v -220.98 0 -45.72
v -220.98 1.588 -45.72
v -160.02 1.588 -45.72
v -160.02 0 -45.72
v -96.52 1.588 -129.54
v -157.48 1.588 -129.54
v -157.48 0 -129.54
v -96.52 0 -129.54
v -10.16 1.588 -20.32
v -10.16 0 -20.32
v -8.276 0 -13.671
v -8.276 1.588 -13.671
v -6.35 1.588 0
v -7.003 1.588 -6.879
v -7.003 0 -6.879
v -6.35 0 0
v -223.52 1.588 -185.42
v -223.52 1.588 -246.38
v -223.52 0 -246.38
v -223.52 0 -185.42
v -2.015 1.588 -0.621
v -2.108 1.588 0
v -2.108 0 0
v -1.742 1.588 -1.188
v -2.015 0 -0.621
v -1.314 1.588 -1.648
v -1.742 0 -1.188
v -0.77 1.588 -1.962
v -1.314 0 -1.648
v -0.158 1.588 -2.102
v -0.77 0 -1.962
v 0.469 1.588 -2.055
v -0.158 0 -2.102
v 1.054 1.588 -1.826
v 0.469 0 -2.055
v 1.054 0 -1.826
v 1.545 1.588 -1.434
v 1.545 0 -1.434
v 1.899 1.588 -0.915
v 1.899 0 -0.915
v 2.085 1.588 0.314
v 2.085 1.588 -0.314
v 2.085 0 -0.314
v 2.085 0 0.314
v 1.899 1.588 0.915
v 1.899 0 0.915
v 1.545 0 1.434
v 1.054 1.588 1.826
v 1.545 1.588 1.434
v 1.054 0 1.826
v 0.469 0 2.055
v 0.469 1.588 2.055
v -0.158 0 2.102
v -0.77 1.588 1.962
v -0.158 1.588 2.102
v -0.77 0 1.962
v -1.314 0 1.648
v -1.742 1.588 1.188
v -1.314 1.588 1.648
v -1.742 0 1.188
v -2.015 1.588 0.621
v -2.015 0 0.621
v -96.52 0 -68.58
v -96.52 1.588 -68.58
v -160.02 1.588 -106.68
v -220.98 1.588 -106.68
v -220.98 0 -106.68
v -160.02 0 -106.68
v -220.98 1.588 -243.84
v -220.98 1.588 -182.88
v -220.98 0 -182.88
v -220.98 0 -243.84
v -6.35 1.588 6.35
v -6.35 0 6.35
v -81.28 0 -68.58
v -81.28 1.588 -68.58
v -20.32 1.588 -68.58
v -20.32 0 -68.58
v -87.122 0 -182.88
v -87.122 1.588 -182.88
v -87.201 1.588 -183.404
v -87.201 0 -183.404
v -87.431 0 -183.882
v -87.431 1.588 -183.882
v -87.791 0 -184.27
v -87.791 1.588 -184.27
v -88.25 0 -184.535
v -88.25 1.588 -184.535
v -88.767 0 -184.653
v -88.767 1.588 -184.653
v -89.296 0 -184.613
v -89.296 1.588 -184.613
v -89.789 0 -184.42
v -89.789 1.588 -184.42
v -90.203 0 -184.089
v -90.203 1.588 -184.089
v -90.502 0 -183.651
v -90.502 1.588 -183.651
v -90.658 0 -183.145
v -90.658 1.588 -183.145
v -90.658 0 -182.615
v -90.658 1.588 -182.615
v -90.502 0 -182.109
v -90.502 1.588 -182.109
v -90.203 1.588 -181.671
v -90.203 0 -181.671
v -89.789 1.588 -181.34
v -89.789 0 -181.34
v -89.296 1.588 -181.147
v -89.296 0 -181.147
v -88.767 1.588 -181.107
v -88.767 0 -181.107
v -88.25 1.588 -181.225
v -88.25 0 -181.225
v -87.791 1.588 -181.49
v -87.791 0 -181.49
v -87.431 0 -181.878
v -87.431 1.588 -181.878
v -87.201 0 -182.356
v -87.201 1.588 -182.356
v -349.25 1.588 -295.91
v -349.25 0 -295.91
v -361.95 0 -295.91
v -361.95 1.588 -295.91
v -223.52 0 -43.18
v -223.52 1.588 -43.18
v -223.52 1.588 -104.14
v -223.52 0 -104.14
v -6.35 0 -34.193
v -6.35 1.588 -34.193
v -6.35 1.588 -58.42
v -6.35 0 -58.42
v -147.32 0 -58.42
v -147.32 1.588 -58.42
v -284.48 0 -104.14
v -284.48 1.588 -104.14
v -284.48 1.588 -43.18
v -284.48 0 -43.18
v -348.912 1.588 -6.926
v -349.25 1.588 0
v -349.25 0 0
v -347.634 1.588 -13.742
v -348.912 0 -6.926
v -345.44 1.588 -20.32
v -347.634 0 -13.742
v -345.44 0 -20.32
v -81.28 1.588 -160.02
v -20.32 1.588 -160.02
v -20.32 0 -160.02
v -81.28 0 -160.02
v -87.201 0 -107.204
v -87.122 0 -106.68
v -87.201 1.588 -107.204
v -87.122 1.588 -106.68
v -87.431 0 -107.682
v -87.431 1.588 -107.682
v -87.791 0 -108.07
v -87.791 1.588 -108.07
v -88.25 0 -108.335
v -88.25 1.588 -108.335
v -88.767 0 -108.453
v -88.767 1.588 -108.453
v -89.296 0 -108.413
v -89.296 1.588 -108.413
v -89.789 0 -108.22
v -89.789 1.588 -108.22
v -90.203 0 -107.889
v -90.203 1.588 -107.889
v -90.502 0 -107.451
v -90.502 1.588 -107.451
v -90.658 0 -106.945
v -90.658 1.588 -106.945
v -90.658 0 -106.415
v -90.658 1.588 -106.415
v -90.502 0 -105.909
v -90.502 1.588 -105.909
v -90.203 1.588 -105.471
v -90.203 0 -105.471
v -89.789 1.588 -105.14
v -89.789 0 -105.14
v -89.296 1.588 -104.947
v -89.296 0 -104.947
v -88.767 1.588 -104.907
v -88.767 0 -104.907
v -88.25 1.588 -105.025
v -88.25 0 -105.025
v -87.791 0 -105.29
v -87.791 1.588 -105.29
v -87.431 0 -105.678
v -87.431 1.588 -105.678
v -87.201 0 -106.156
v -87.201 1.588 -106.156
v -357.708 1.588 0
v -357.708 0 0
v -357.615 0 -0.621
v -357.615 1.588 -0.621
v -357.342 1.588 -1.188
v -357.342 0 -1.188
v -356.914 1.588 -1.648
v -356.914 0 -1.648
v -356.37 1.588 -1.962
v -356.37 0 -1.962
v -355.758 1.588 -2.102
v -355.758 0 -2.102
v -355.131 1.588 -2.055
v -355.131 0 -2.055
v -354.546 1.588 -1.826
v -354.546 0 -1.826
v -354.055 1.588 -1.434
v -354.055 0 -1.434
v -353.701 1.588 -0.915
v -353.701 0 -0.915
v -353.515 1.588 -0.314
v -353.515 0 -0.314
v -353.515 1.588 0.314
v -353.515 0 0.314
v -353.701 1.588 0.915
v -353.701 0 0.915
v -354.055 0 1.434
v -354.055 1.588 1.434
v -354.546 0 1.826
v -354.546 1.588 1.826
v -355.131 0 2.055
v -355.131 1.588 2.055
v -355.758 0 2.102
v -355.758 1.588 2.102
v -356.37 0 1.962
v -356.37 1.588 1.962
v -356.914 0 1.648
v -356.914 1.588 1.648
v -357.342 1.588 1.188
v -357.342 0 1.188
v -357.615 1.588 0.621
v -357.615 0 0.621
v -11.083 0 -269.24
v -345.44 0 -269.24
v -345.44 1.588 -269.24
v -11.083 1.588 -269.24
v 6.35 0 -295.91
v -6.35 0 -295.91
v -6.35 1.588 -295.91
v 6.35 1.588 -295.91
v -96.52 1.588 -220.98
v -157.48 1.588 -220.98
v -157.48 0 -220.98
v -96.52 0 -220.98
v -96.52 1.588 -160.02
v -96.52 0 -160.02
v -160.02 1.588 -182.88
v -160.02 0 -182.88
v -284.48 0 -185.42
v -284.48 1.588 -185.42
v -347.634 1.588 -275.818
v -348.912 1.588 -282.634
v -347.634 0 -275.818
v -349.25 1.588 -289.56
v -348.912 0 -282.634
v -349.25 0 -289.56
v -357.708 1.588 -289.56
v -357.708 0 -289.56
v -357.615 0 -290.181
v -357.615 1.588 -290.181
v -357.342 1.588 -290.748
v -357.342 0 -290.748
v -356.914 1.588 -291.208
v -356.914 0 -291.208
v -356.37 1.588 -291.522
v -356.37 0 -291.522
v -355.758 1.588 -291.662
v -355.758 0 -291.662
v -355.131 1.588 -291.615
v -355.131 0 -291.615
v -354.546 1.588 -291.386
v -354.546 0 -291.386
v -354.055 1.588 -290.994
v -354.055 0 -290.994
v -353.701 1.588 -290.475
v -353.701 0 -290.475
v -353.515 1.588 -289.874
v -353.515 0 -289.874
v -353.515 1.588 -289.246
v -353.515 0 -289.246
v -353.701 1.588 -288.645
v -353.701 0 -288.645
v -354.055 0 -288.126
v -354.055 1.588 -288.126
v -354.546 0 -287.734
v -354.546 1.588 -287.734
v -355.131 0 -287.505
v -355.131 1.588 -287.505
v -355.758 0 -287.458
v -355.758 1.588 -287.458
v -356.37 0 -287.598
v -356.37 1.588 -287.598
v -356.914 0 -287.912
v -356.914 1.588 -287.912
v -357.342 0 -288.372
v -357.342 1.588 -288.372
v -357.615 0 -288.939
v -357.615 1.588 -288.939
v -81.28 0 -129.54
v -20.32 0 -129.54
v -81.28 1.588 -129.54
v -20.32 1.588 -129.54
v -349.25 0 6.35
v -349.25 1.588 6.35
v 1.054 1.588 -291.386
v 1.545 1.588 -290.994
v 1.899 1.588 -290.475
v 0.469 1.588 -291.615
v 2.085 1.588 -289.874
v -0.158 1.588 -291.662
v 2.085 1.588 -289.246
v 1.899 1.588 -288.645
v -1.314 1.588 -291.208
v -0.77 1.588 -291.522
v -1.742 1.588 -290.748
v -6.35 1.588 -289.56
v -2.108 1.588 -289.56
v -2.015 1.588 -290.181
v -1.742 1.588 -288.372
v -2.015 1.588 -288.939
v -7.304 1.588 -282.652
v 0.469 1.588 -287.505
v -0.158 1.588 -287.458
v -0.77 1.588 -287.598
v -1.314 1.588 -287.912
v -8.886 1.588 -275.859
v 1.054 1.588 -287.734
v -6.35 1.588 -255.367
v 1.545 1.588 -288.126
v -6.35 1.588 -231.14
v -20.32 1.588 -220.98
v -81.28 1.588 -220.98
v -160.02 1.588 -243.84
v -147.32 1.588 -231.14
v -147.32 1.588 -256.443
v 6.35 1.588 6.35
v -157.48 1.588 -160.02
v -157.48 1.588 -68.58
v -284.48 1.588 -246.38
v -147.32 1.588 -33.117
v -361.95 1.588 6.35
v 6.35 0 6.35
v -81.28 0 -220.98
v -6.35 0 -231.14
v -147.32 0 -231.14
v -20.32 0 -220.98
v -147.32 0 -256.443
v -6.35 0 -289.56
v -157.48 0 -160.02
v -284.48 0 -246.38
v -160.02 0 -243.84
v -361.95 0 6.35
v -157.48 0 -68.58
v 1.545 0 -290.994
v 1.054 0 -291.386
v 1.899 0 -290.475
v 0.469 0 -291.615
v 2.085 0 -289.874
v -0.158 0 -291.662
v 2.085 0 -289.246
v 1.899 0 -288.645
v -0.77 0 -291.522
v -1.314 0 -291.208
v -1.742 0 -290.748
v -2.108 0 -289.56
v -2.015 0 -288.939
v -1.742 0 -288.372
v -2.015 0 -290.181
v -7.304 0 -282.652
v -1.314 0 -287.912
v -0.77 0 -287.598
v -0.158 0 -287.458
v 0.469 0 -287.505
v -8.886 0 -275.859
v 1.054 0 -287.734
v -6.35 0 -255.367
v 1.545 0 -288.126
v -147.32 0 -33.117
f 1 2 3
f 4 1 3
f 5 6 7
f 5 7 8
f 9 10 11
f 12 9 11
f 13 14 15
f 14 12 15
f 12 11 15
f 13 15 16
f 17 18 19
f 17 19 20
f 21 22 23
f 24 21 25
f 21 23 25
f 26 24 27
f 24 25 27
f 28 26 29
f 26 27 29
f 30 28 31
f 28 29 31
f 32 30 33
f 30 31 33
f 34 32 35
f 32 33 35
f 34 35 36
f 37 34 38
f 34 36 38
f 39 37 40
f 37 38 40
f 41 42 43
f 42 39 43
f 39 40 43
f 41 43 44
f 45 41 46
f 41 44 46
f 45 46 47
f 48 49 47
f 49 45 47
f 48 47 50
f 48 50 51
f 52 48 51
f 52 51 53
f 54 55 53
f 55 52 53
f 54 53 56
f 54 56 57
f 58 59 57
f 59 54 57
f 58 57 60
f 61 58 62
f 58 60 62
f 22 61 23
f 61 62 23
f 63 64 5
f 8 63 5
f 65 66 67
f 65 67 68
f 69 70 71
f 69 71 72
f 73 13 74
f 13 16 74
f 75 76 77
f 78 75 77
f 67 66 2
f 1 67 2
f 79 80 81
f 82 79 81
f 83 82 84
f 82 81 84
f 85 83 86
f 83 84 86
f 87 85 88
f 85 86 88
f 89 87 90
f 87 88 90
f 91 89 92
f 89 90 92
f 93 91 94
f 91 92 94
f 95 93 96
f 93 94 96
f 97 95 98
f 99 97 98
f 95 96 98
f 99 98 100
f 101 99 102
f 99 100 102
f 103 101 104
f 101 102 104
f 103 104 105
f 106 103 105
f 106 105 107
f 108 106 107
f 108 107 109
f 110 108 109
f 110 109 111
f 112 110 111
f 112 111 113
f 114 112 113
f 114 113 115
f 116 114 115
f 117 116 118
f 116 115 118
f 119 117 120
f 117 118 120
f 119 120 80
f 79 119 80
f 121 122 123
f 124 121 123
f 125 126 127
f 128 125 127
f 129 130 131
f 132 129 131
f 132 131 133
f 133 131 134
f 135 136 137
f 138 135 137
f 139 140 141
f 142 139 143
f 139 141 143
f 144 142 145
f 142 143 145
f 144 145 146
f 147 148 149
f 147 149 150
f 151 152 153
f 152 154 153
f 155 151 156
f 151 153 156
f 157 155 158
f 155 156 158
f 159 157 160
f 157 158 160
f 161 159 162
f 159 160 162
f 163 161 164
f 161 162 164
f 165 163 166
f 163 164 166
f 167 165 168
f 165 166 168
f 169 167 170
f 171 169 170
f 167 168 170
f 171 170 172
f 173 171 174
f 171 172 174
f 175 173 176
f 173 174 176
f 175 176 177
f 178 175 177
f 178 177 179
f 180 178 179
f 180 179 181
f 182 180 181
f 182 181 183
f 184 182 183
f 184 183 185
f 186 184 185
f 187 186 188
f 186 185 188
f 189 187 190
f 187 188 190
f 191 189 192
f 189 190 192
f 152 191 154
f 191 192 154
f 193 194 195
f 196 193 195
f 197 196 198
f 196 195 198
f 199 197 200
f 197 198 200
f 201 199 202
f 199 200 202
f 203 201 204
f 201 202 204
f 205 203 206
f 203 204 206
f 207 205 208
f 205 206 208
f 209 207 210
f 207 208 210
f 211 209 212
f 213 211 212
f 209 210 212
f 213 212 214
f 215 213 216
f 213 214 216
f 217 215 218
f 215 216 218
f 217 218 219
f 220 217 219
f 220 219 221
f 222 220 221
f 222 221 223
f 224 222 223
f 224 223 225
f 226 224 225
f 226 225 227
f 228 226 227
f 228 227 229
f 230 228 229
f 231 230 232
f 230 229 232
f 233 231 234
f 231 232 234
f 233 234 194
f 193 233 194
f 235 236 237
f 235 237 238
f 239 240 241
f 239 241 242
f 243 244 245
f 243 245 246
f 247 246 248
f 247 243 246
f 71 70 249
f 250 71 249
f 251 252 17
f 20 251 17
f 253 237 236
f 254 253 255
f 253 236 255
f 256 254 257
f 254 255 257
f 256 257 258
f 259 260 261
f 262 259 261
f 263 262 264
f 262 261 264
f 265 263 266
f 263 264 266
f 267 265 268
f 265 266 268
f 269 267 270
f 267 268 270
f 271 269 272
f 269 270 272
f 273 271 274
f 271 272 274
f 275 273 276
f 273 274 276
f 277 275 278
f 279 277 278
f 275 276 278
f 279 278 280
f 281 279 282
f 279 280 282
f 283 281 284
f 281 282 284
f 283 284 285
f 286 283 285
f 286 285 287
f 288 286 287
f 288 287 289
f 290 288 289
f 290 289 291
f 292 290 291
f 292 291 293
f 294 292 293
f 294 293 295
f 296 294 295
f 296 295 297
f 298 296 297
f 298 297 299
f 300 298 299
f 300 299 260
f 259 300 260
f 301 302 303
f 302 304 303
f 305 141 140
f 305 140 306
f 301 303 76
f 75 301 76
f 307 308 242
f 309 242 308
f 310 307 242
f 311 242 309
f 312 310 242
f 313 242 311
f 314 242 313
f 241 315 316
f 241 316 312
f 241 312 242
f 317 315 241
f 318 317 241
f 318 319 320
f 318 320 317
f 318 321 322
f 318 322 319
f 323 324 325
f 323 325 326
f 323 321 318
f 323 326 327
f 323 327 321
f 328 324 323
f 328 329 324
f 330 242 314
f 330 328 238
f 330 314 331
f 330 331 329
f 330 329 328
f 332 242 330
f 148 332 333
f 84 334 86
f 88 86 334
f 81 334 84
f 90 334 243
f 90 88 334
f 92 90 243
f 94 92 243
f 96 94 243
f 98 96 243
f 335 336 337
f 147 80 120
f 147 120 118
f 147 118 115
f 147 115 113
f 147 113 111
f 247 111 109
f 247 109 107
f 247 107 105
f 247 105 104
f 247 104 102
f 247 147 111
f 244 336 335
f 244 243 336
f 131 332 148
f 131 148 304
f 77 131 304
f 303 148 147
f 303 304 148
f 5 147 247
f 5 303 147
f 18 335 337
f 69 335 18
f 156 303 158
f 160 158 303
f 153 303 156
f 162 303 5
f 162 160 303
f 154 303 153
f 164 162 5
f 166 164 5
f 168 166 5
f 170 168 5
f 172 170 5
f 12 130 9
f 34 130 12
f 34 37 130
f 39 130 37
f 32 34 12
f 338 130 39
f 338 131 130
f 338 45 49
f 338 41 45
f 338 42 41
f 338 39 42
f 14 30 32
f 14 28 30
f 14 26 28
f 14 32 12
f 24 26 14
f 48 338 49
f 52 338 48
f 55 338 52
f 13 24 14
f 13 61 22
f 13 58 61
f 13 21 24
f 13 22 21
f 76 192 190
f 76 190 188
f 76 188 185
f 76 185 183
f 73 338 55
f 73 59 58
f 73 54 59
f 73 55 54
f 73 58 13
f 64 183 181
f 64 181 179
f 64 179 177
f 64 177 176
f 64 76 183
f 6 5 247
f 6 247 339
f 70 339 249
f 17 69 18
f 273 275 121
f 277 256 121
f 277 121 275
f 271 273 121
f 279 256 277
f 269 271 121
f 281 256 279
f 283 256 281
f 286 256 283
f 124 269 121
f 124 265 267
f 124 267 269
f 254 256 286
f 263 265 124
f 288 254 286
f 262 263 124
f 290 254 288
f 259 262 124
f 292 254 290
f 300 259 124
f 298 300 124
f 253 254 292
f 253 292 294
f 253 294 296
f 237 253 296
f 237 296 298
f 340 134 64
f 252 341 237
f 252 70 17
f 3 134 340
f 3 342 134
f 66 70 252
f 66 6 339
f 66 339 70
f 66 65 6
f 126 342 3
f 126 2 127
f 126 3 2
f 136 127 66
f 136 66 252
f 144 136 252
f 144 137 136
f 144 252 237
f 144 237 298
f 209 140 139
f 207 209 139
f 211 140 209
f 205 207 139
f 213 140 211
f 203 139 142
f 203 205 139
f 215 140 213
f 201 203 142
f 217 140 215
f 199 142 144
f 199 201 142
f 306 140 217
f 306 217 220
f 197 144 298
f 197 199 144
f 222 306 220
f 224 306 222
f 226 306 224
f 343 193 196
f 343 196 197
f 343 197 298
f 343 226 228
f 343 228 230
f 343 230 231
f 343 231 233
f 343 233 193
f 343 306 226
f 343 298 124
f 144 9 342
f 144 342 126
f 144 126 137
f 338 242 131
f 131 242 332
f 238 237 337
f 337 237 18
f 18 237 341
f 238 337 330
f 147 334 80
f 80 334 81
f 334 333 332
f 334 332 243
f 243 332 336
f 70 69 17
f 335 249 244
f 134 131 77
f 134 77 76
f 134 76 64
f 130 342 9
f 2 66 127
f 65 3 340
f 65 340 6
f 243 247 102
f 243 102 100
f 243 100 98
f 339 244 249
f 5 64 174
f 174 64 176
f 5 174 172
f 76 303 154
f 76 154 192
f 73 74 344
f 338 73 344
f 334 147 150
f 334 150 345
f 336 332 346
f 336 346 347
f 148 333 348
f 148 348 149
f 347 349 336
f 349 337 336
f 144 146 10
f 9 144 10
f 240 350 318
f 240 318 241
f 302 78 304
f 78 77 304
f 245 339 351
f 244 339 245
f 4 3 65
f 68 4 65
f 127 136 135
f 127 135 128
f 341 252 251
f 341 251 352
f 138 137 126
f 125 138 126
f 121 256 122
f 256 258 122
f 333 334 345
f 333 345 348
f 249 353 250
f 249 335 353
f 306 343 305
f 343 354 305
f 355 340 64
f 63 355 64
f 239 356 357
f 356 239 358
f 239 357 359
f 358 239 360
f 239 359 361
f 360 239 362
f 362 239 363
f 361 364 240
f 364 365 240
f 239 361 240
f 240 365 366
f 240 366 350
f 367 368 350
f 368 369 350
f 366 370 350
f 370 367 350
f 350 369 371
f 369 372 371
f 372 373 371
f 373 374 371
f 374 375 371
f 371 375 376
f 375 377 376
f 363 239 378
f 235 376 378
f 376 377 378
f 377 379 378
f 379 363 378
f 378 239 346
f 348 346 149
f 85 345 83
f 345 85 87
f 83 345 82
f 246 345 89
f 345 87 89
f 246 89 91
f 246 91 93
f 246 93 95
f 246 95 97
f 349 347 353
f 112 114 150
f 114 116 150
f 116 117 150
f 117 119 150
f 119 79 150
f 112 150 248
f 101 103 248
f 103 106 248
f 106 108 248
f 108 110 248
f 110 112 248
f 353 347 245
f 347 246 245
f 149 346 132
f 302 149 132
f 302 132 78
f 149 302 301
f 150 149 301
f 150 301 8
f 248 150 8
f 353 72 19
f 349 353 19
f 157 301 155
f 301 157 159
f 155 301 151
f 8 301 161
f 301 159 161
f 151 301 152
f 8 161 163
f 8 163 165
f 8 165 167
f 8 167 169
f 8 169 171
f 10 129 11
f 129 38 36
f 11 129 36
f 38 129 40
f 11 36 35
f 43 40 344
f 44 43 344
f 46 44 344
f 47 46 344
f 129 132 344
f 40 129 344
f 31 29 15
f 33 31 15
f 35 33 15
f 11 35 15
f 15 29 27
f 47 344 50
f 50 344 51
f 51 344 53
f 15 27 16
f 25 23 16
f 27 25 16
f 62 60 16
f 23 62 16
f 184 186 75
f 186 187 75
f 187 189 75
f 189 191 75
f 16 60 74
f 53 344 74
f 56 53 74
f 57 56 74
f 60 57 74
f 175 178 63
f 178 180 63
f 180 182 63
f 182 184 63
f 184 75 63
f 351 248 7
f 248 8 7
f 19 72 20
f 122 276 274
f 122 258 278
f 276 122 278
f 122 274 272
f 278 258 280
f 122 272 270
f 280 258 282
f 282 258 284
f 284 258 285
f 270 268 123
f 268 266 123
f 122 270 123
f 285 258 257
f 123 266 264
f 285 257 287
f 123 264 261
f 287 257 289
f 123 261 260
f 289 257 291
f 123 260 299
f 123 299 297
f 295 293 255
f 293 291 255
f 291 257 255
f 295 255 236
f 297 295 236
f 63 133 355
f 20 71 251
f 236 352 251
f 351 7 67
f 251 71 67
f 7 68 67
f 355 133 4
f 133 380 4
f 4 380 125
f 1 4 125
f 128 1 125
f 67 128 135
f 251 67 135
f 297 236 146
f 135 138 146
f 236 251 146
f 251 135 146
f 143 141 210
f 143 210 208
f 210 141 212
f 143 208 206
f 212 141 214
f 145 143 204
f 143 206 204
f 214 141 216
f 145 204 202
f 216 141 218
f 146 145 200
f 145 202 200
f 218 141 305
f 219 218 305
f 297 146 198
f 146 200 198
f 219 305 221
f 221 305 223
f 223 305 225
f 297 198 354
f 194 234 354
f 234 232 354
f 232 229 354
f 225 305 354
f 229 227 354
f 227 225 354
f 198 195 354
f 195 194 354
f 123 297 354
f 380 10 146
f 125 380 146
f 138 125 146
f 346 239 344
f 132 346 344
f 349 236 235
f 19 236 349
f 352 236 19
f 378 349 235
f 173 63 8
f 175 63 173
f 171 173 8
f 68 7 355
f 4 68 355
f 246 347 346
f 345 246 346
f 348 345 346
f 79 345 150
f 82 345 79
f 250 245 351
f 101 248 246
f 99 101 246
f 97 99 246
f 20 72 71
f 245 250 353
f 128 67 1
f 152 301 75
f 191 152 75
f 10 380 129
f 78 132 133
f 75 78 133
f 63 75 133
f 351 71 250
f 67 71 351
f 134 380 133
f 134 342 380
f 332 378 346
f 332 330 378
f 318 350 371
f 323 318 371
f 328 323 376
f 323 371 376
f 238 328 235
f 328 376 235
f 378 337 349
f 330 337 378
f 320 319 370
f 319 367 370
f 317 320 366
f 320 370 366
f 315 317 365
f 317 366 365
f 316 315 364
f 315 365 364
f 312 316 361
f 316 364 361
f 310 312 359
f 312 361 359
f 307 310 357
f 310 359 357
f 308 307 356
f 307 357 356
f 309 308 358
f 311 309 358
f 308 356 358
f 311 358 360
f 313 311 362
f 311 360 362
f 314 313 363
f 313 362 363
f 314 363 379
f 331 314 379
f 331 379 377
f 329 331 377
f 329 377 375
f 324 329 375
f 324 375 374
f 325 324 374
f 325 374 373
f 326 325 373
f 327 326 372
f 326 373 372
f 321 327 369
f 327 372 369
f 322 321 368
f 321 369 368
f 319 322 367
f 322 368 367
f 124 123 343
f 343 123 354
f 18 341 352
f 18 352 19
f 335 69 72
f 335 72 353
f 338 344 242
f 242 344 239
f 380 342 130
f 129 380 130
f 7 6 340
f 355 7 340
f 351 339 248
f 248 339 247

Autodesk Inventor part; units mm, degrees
ref_plane "YZ Plane" through (0, 0, 0) normal (1, 0, 0) x (0, 1, 0)
ref_plane "XZ Plane" through (0, 0, 0) normal (0, 1, 0) x (-1, 0, 0)
ref_plane "XY Plane" through (0, 0, 0) normal (0, 0, 1) x (1, 0, 0)
sketch "Sketch1" plane through (0, 0, 0) normal (0, 1, 0) x (-1, 0, 0)
  line L0 (0, 0) -> (355.6, 0)
  line L1 (355.6, 0) -> (355.6, -289.56)
  line L2 (355.6, -289.56) -> (0, -289.56)
  line L3 (0, -289.56) -> (0, 0)
  circle A0 centre (355.6, 0) radius 2.1082
  line L4 (355.6, 0) -> (361.95, 0)
  line L5 (355.6, 0) -> (355.6, 6.35)
  line L6 (355.6, 6.35) -> (361.95, 6.35)
  line L7 (0, -289.56) -> (0, -295.91)
  line L8 (0, -295.91) -> (-6.35, -295.91)
  line L9 (-6.35, -295.91) -> (361.95, -295.91)
  line L10 (361.95, -295.91) -> (361.95, 6.35)
  line L11 (361.95, 6.35) -> (-6.35, 6.35)
  line L12 (-6.35, 6.35) -> (-6.35, -295.91)
  circle A1 centre (355.6, -289.56) radius 2.1082
  circle A2 centre (0, -289.56) radius 2.1082
  circle A3 centre (0, 0) radius 2.1082
  line L13 (0, 0) -> (0, -20.32)
  line L14 (0, -20.32) -> (10.16, -20.32)
  line L15 (0, 0) -> (5.08, 0)
  line L16 (0, -289.56) -> (5.08, -289.56)
  line L17 (0, -289.56) -> (0, -269.24)
  line L18 (0, -269.24) -> (11.0826, -269.24)
  line L19 (355.6, 0) -> (355.6, -20.32)
  line L20 (355.6, -20.32) -> (345.44, -20.32)
  line L21 (355.6, 0) -> (350.52, 0)
  line L22 (355.6, -289.56) -> (350.52, -289.56)
  line L23 (355.6, -289.56) -> (355.6, -269.24)
  line L24 (355.6, -269.24) -> (345.44, -269.24)
  line L25 (345.44, -20.32) -> (10.16, -20.32)
  line L26 (355.6, -20.32) -> (355.6, -33.02)
  line L27 (355.6, -33.02) -> (0, -33.02)
  line L28 (355.6, -269.24) -> (355.6, -256.54)
  line L29 (355.6, -256.54) -> (0, -256.54)
  line L30 (345.44, -269.24) -> (11.0826, -269.24)
  line L31 (0, 0) -> (6.35, 0)
  arc A4 (6.35, 0) -> (10.16, -20.32) centre (82.4575, 3.753) ccw
  line L32 (6.35, 0) -> (-6.35, 0)
  line L33 (-6.35, 0) -> (-6.35, -289.56)
  line L34 (-6.35, -289.56) -> (6.35, -289.56)
  line L35 (6.35, -289.56) -> (6.35, 0)
  arc A5 (11.0826, -269.24) -> (6.35, -289.56) centre (82.2313, -296.5221) ccw
  line L36 (355.6, 0) -> (349.25, 0)
  line L37 (349.25, 0) -> (349.25, -289.56)
  arc A6 (349.25, -289.56) -> (345.44, -269.24) centre (298.4597, -288.566) ccw
  arc A7 (345.44, -20.32) -> (349.25, 0) centre (298.4597, -0.994) ccw
  line L38 (349.25, 0) -> (349.25, 6.35)
  line L39 (349.25, -289.56) -> (349.25, -295.91)
  line L40 (6.35, -289.56) -> (6.35, -295.91)
  line L41 (6.35, 0) -> (6.35, 6.35)
  dimension "d0" = 355.6
  dimension "d1" = 289.56
  dimension "d2" = 4.2164
  dimension "d3" = 6.35
  dimension "d4" = 6.35
  dimension "d5" = 6.35
  dimension "d6" = 6.35
  dimension "d7" = 20.32
  dimension "d8" = 10.16
  dimension "d10" = 20.32
  dimension "d12" = 20.32
  dimension "d13" = 10.16
  dimension "d16" = 5.08
  dimension "d17" = 20.32
  dimension "d18" = 10.16
  dimension "d20" = 12.7
  dimension "d21" = 12.7
  dimension "d23" = 6.35
  dimension "d24" = 76.2
  dimension "d25" = 76.2
  dimension "d26" = 6.35
  dimension "d27" = 50.8
  dimension "d28" = 50.8
extrude "Extrusion1" add sketch "Sketch1" along normal blind 1.5875 contours A3 L32 L12 L11 L41 L0 | L0 L35 L14 L3 A3 | L3 A2 L34 L12 L32 A3 | L14 L35 L27 L3 | A4 L14 L35 | L27 L35 L29 L3 | L14 L25 L20 L37 L27 L35 | L34 A2 L7 L8 L12 | L38 L11 L5 A0 L0 | L0 A0 L1 L20 L37 A7 | L29 L35 L18 L3 | L27 L37 L29 L35 | L37 L20 A7 | L18 L35 L2 A2 L3 | L29 L37 L24 L30 L18 L35 | L37 L20 L1 L27 | L27 L1 L29 L37 | L7 A2 L2 L40 L9 | L6 L10 L4 A0 L5 | L18 A5 L35 | L29 L1 L24 L37 | L1 A0 L4 L10 L9 L39 L2 A1 | L37 A6 L24 | L24 L1 A1 L2 A6 L37
sketch "Sketch2" plane through (0, 1.5875, 0) normal (0, 1, 0) x (1, 0, 0)
  circle A0 centre (-355.6, 289.56) radius 2.1082 projected
  line L0 (-355.6, 289.56) -> (-355.6, 246.38)
  line L1 (-355.6, 246.38) -> (-284.48, 246.38)
  line L2 (-355.6, 289.56) -> (-355.6, 185.42)
  line L3 (-355.6, 185.42) -> (-223.52, 185.42)
  line L4 (-284.48, 246.38) -> (-223.52, 246.38)
  line L5 (-223.52, 246.38) -> (-223.52, 185.42)
  line L6 (-223.52, 185.42) -> (-284.48, 185.42)
  line L7 (-284.48, 185.42) -> (-284.48, 246.38)
  line L8 (-355.6, 289.56) -> (-355.6, 243.84)
  line L9 (-355.6, 243.84) -> (-220.98, 243.84)
  line L10 (-355.6, 289.56) -> (-355.6, 184.15)
  line L11 (-355.6, 289.56) -> (-355.6, 182.88)
  line L12 (-355.6, 182.88) -> (-160.02, 182.88)
  line L13 (-220.98, 243.84) -> (-160.02, 243.84)
  line L14 (-160.02, 243.84) -> (-160.02, 182.88)
  line L15 (-160.02, 182.88) -> (-220.98, 182.88)
  line L16 (-220.98, 182.88) -> (-220.98, 243.84)
  line L17 (-355.6, 289.56) -> (-355.6, 220.98)
  line L18 (-355.6, 220.98) -> (-157.48, 220.98)
  line L19 (-355.6, 289.56) -> (-355.6, 160.02)
  line L20 (-355.6, 160.02) -> (-96.52, 160.02)
  line L21 (-157.48, 220.98) -> (-96.52, 220.98)
  line L22 (-96.52, 220.98) -> (-96.52, 160.02)
  line L23 (-96.52, 160.02) -> (-157.48, 160.02)
  line L24 (-157.48, 160.02) -> (-157.48, 220.98)
  line L25 (-355.6, 289.56) -> (-81.28, 289.56)
  line L26 (-81.28, 289.56) -> (-81.28, 220.98)
  line L27 (-355.6, 289.56) -> (-20.32, 289.56)
  line L28 (-20.32, 289.56) -> (-20.32, 160.02)
  line L29 (-81.28, 220.98) -> (-20.32, 220.98)
  line L30 (-20.32, 220.98) -> (-20.32, 160.02)
  line L31 (-20.32, 160.02) -> (-81.28, 160.02)
  line L32 (-81.28, 160.02) -> (-81.28, 220.98)
  line L33 (-355.6, 289.56) -> (-160.02, 289.56)
  line L34 (-160.02, 289.56) -> (-160.02, 269.24)
  line L35 (-11.0826, 269.24) -> (-345.44, 269.24) projected
  line L36 (-160.02, 269.24) -> (-160.02, 256.54)
  line L37 (-160.02, 256.54) -> (6.35, 255.27)
  line L38 (6.35, -6.35) -> (6.35, 295.91) projected
  line L39 (6.35, 255.27) -> (-6.3496, 255.3669)
  line L40 (-160.02, 289.56) -> (-160.02, 231.14)
  line L41 (-6.3496, 255.3669) -> (-6.3496, 231.14)
  line L42 (-6.3496, 231.14) -> (-160.02, 231.14)
  line L43 (-160.02, 256.54) -> (-147.32, 256.54)
  line L44 (-147.32, 256.54) -> (-147.32, 231.14)
  line L45 (-147.32, 231.14) -> (-160.02, 231.14)
  line L46 (-160.02, 231.14) -> (-160.02, 256.54)
  line L47 (6.35, 295.91) -> (6.35, -6.35)
  line L48 (-361.95, 295.91) -> (-361.95, -6.35) projected
  line L49 (6.35, 144.78) -> (-361.95, 144.78)
  circle A1 centre (-355.6, 0) radius 2.1082
  line L50 (-355.6, 0) -> (-355.6, 43.18)
  line L51 (-355.6, 43.18) -> (-284.48, 43.18)
  line L52 (-355.6, 0) -> (-355.6, 104.14)
  line L53 (-355.6, 104.14) -> (-223.52, 104.14)
  line L54 (-284.48, 43.18) -> (-223.52, 43.18)
  line L55 (-223.52, 43.18) -> (-223.52, 104.14)
  line L56 (-223.52, 104.14) -> (-284.48, 104.14)
  line L57 (-284.48, 104.14) -> (-284.48, 43.18)
  line L58 (-355.6, 0) -> (-355.6, 45.72)
  line L59 (-355.6, 45.72) -> (-220.98, 45.72)
  line L60 (-355.6, 0) -> (-355.6, 105.41)
  line L61 (-355.6, 0) -> (-355.6, 106.68)
  line L62 (-355.6, 106.68) -> (-160.02, 106.68)
  line L63 (-220.98, 45.72) -> (-160.02, 45.72)
  line L64 (-160.02, 45.72) -> (-160.02, 106.68)
  line L65 (-160.02, 106.68) -> (-220.98, 106.68)
  line L66 (-220.98, 106.68) -> (-220.98, 45.72)
  line L67 (-355.6, 0) -> (-355.6, 68.58)
  line L68 (-355.6, 68.58) -> (-157.48, 68.58)
  line L69 (-355.6, 0) -> (-355.6, 129.54)
  line L70 (-355.6, 129.54) -> (-96.52, 129.54)
  line L71 (-157.48, 68.58) -> (-96.52, 68.58)
  line L72 (-96.52, 68.58) -> (-96.52, 129.54)
  line L73 (-96.52, 129.54) -> (-157.48, 129.54)
  line L74 (-157.48, 129.54) -> (-157.48, 68.58)
  line L75 (-355.6, 0) -> (-81.28, 0)
  line L76 (-81.28, 0) -> (-81.28, 68.58)
  line L77 (-355.6, 0) -> (-20.32, 0)
  line L78 (-20.32, 0) -> (-20.32, 129.54)
  line L79 (-81.28, 68.58) -> (-20.32, 68.58)
  line L80 (-20.32, 68.58) -> (-20.32, 129.54)
  line L81 (-20.32, 129.54) -> (-81.28, 129.54)
  line L82 (-81.28, 129.54) -> (-81.28, 68.58)
  line L83 (-355.6, 0) -> (-160.02, 0)
  line L84 (-160.02, 0) -> (-160.02, 20.32)
  line L85 (-11.0826, 20.32) -> (-345.44, 20.32)
  line L86 (-160.02, 20.32) -> (-160.02, 33.02)
  line L87 (-160.02, 33.02) -> (6.35, 34.29)
  line L88 (6.35, 34.29) -> (-6.3496, 34.1931)
  line L89 (-160.02, 0) -> (-160.02, 58.42)
  line L90 (-6.3496, 34.1931) -> (-6.3496, 58.42)
  line L91 (-6.3496, 58.42) -> (-160.02, 58.42)
  line L92 (-160.02, 33.02) -> (-147.32, 33.02)
  line L93 (-147.32, 33.02) -> (-147.32, 58.42)
  line L94 (-147.32, 58.42) -> (-160.02, 58.42)
  line L95 (-160.02, 58.42) -> (-160.02, 33.02)
  line L96 (-361.95, -6.35) -> (-361.95, 295.91)
  line L97 (-96.52, 160.02) -> (-81.28, 160.02)
  line L98 (-88.9, 160.02) -> (-88.9, 144.78)
  line L99 (-88.9, 144.78) -> (-88.9, 182.88)
  circle A2 centre (-88.9, 182.88) radius 1.778
  line L100 (-88.9, 144.78) -> (-88.9, 106.68)
  circle A3 centre (-88.9, 106.68) radius 1.778
  point P0 (0, 0)
  point P1 (-223.52, 243.84)
  point P2 (-284.48, 243.84)
  point P3 (-147.32, 256.4431)
  point P4 (-147.32, 33.1169)
  dimension "d31" = 43.18
  dimension "d32" = 71.12
  dimension "d33" = 104.14
  dimension "d34" = 132.08
  dimension "d35" = 45.72
  dimension "d36" = 134.62
  dimension "d37" = 105.41
  dimension "d38" = 106.68
  dimension "d39" = 195.58
  dimension "d42" = 68.58
  dimension "d43" = 198.12
  dimension "d44" = 129.54
  dimension "d45" = 259.08
  dimension "d46" = 274.32
  dimension "d47" = 68.58
  dimension "d49" = 335.28
  dimension "d50" = 129.54
  dimension "d51" = 195.58
  dimension "d52" = 12.7
  dimension "d53" = 12.7
  dimension "d54" = 58.42
  dimension "d55" = 12.7
  dimension "d56" = 38.1
  dimension "d57" = 3.556
  dimension "d58" = 38.1
  dimension "d59" = 3.556
extrude "Extrusion2" cut sketch "Sketch2" against normal blind 25.4 contours L87 L78 L91 L90 | A3 | L4 L5 L9 L7 | L9 L5 L18 L7 | L37 L28 L42 L26 | L26 L42 L44 L37 | L14 L18 L16 L13 | L18 L5 L3 L7 | A2 | L37 L41 L42 L28 | L29 L28 L31 L32 | L18 L14 L12 L16 | L21 L22 L20 L24 | L87 L76 L91 L78 | L87 L93 L91 L76 | L79 L82 L81 L78 | L64 L63 L66 L68 | L68 L66 L62 L64 | L74 L70 L72 L71 | L59 L57 L68 L55 | L55 L54 L57 L59 | L68 L57 L53 L55
properties part number "belly pan"
